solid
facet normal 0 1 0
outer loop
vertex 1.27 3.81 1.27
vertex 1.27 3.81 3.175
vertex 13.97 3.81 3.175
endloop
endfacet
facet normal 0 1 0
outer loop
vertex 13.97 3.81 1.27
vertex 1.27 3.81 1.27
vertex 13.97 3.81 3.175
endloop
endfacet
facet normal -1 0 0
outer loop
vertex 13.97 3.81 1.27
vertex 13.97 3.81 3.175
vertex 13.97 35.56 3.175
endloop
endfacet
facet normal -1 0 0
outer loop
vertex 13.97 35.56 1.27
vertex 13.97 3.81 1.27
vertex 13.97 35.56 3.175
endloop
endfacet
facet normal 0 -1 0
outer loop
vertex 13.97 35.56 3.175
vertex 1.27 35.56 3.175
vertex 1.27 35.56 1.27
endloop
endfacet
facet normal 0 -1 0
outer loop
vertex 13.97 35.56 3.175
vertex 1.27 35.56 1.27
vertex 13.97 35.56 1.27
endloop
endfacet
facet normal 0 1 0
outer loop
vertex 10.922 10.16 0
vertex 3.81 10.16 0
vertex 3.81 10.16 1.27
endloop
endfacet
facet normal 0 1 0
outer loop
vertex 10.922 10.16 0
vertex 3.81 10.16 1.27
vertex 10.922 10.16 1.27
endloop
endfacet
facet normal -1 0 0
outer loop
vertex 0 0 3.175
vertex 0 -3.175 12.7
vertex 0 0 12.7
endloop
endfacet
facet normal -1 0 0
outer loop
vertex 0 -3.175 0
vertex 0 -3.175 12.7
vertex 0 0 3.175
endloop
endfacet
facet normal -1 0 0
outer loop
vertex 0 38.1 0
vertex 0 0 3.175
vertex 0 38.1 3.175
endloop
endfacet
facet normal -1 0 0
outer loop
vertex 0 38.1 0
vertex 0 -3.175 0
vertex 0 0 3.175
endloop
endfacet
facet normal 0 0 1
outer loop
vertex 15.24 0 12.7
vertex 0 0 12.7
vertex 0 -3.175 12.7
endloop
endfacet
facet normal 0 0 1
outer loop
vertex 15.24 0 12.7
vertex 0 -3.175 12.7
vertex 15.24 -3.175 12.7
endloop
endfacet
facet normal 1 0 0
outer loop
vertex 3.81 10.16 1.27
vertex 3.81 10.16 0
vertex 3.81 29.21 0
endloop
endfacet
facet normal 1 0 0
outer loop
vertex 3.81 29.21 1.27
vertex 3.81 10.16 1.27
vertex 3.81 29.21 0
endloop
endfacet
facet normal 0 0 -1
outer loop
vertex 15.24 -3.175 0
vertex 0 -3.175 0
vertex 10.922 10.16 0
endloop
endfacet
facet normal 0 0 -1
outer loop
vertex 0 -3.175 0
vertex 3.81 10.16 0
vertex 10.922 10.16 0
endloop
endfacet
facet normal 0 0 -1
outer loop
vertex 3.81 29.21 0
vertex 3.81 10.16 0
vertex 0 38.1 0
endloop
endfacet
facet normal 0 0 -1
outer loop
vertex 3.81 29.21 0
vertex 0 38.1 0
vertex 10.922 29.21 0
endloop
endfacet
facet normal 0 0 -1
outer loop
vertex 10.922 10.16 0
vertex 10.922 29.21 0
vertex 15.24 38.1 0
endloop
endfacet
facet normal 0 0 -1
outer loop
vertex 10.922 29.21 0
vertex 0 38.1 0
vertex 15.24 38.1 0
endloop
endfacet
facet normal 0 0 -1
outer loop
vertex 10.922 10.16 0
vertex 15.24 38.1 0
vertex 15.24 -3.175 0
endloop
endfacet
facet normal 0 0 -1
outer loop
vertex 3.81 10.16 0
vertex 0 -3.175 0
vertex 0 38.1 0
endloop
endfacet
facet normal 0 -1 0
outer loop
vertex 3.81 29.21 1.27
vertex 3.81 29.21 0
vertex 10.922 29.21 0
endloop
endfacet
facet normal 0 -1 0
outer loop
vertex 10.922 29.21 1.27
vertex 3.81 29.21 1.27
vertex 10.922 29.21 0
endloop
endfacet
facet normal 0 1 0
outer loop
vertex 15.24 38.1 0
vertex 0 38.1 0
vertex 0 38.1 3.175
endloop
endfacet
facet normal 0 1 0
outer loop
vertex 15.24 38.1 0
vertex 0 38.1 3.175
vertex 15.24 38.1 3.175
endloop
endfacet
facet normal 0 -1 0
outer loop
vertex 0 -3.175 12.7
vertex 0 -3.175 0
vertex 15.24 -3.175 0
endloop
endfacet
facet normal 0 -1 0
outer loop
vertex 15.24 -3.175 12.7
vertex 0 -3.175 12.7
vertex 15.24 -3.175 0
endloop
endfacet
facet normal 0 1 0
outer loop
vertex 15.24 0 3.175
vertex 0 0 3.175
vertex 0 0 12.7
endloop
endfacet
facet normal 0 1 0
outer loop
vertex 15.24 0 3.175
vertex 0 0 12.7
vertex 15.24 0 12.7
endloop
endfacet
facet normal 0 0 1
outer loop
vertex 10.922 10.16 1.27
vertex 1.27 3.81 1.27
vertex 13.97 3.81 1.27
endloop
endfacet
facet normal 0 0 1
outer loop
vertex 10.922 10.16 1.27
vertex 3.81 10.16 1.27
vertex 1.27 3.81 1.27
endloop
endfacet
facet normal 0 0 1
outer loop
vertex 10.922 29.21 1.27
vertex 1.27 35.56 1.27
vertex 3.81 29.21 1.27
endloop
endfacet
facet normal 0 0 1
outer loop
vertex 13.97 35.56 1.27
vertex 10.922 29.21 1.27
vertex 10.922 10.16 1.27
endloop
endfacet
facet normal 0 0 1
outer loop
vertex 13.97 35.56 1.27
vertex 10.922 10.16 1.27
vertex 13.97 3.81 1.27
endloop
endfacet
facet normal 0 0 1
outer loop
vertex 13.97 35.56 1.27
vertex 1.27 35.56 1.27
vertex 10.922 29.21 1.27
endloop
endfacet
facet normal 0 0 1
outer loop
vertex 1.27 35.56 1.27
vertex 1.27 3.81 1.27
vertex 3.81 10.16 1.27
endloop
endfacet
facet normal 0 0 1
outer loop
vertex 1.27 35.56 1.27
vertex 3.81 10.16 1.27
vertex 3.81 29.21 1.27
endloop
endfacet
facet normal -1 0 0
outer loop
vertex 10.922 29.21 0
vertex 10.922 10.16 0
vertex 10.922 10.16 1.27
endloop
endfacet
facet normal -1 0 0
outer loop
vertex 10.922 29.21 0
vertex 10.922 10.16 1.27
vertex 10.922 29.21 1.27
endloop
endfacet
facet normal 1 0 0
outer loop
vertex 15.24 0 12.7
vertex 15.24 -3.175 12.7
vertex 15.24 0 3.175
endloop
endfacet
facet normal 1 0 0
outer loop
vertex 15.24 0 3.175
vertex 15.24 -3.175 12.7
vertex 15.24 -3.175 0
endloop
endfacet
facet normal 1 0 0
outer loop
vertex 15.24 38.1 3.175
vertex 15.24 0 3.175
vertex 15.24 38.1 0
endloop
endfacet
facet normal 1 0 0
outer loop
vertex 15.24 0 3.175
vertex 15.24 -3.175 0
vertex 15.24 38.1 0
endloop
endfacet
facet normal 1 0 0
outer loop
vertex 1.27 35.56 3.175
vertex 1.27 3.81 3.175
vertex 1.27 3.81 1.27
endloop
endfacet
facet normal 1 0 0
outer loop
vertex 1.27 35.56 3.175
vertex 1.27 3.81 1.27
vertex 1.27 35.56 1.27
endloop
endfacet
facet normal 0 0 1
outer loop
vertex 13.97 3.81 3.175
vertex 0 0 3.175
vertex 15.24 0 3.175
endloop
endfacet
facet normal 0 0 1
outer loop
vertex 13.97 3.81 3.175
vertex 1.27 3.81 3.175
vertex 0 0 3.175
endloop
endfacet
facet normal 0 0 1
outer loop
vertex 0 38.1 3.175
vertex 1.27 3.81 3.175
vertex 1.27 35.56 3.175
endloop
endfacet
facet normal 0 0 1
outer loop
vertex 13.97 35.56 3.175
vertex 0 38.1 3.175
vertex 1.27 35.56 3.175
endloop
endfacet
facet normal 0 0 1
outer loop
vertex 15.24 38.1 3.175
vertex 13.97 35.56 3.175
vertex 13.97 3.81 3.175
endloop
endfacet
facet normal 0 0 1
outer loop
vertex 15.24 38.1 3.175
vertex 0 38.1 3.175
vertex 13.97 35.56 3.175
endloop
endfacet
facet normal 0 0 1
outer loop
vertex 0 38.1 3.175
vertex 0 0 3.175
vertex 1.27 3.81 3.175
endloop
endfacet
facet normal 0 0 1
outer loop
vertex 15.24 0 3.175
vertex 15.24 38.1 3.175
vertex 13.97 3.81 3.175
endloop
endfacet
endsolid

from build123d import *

# Parameters (mm, degrees)
F0_W     = 15.24
F0_H     = 38.1
F0_W_2   = 7.112
F0_H_2   = 19.05
F1_DEPTH = 3.175
F2_W     = 12.7
F2_H     = 31.75
F2_W_2   = 7.112
F2_H_2   = 19.05
F3_DEPTH = 1.905
F0_H_3   = 3.175
F4_DEPTH = 12.7


with BuildPart() as f1:
    # F0 (on Top) → F1 (new body)
    with BuildSketch(Plane.XY):
        with Locations((7.62, 19.05)):
            Rectangle(F0_W, F0_H)
        with Locations((7.366, 19.685)):
            Rectangle(F0_W_2, F0_H_2, mode=Mode.SUBTRACT)
    extrude(amount=F1_DEPTH)

    # F2 (on face) → F3 (cut)
    with BuildSketch(Plane.XY.offset(3.175)):
        with Locations((7.62, 19.685)):
            Rectangle(F2_W, F2_H)
        with Locations((7.366, 19.685)):
            Rectangle(F2_W_2, F2_H_2, mode=Mode.SUBTRACT)
    extrude(amount=-F3_DEPTH, mode=Mode.SUBTRACT)

    # F0 (on Top) → F4 (join)
    with BuildSketch(Plane.XY):
        with Locations((7.62, -1.5875)):
            Rectangle(F0_W, F0_H_3)
    extrude(amount=F4_DEPTH)


solid = f1.part
